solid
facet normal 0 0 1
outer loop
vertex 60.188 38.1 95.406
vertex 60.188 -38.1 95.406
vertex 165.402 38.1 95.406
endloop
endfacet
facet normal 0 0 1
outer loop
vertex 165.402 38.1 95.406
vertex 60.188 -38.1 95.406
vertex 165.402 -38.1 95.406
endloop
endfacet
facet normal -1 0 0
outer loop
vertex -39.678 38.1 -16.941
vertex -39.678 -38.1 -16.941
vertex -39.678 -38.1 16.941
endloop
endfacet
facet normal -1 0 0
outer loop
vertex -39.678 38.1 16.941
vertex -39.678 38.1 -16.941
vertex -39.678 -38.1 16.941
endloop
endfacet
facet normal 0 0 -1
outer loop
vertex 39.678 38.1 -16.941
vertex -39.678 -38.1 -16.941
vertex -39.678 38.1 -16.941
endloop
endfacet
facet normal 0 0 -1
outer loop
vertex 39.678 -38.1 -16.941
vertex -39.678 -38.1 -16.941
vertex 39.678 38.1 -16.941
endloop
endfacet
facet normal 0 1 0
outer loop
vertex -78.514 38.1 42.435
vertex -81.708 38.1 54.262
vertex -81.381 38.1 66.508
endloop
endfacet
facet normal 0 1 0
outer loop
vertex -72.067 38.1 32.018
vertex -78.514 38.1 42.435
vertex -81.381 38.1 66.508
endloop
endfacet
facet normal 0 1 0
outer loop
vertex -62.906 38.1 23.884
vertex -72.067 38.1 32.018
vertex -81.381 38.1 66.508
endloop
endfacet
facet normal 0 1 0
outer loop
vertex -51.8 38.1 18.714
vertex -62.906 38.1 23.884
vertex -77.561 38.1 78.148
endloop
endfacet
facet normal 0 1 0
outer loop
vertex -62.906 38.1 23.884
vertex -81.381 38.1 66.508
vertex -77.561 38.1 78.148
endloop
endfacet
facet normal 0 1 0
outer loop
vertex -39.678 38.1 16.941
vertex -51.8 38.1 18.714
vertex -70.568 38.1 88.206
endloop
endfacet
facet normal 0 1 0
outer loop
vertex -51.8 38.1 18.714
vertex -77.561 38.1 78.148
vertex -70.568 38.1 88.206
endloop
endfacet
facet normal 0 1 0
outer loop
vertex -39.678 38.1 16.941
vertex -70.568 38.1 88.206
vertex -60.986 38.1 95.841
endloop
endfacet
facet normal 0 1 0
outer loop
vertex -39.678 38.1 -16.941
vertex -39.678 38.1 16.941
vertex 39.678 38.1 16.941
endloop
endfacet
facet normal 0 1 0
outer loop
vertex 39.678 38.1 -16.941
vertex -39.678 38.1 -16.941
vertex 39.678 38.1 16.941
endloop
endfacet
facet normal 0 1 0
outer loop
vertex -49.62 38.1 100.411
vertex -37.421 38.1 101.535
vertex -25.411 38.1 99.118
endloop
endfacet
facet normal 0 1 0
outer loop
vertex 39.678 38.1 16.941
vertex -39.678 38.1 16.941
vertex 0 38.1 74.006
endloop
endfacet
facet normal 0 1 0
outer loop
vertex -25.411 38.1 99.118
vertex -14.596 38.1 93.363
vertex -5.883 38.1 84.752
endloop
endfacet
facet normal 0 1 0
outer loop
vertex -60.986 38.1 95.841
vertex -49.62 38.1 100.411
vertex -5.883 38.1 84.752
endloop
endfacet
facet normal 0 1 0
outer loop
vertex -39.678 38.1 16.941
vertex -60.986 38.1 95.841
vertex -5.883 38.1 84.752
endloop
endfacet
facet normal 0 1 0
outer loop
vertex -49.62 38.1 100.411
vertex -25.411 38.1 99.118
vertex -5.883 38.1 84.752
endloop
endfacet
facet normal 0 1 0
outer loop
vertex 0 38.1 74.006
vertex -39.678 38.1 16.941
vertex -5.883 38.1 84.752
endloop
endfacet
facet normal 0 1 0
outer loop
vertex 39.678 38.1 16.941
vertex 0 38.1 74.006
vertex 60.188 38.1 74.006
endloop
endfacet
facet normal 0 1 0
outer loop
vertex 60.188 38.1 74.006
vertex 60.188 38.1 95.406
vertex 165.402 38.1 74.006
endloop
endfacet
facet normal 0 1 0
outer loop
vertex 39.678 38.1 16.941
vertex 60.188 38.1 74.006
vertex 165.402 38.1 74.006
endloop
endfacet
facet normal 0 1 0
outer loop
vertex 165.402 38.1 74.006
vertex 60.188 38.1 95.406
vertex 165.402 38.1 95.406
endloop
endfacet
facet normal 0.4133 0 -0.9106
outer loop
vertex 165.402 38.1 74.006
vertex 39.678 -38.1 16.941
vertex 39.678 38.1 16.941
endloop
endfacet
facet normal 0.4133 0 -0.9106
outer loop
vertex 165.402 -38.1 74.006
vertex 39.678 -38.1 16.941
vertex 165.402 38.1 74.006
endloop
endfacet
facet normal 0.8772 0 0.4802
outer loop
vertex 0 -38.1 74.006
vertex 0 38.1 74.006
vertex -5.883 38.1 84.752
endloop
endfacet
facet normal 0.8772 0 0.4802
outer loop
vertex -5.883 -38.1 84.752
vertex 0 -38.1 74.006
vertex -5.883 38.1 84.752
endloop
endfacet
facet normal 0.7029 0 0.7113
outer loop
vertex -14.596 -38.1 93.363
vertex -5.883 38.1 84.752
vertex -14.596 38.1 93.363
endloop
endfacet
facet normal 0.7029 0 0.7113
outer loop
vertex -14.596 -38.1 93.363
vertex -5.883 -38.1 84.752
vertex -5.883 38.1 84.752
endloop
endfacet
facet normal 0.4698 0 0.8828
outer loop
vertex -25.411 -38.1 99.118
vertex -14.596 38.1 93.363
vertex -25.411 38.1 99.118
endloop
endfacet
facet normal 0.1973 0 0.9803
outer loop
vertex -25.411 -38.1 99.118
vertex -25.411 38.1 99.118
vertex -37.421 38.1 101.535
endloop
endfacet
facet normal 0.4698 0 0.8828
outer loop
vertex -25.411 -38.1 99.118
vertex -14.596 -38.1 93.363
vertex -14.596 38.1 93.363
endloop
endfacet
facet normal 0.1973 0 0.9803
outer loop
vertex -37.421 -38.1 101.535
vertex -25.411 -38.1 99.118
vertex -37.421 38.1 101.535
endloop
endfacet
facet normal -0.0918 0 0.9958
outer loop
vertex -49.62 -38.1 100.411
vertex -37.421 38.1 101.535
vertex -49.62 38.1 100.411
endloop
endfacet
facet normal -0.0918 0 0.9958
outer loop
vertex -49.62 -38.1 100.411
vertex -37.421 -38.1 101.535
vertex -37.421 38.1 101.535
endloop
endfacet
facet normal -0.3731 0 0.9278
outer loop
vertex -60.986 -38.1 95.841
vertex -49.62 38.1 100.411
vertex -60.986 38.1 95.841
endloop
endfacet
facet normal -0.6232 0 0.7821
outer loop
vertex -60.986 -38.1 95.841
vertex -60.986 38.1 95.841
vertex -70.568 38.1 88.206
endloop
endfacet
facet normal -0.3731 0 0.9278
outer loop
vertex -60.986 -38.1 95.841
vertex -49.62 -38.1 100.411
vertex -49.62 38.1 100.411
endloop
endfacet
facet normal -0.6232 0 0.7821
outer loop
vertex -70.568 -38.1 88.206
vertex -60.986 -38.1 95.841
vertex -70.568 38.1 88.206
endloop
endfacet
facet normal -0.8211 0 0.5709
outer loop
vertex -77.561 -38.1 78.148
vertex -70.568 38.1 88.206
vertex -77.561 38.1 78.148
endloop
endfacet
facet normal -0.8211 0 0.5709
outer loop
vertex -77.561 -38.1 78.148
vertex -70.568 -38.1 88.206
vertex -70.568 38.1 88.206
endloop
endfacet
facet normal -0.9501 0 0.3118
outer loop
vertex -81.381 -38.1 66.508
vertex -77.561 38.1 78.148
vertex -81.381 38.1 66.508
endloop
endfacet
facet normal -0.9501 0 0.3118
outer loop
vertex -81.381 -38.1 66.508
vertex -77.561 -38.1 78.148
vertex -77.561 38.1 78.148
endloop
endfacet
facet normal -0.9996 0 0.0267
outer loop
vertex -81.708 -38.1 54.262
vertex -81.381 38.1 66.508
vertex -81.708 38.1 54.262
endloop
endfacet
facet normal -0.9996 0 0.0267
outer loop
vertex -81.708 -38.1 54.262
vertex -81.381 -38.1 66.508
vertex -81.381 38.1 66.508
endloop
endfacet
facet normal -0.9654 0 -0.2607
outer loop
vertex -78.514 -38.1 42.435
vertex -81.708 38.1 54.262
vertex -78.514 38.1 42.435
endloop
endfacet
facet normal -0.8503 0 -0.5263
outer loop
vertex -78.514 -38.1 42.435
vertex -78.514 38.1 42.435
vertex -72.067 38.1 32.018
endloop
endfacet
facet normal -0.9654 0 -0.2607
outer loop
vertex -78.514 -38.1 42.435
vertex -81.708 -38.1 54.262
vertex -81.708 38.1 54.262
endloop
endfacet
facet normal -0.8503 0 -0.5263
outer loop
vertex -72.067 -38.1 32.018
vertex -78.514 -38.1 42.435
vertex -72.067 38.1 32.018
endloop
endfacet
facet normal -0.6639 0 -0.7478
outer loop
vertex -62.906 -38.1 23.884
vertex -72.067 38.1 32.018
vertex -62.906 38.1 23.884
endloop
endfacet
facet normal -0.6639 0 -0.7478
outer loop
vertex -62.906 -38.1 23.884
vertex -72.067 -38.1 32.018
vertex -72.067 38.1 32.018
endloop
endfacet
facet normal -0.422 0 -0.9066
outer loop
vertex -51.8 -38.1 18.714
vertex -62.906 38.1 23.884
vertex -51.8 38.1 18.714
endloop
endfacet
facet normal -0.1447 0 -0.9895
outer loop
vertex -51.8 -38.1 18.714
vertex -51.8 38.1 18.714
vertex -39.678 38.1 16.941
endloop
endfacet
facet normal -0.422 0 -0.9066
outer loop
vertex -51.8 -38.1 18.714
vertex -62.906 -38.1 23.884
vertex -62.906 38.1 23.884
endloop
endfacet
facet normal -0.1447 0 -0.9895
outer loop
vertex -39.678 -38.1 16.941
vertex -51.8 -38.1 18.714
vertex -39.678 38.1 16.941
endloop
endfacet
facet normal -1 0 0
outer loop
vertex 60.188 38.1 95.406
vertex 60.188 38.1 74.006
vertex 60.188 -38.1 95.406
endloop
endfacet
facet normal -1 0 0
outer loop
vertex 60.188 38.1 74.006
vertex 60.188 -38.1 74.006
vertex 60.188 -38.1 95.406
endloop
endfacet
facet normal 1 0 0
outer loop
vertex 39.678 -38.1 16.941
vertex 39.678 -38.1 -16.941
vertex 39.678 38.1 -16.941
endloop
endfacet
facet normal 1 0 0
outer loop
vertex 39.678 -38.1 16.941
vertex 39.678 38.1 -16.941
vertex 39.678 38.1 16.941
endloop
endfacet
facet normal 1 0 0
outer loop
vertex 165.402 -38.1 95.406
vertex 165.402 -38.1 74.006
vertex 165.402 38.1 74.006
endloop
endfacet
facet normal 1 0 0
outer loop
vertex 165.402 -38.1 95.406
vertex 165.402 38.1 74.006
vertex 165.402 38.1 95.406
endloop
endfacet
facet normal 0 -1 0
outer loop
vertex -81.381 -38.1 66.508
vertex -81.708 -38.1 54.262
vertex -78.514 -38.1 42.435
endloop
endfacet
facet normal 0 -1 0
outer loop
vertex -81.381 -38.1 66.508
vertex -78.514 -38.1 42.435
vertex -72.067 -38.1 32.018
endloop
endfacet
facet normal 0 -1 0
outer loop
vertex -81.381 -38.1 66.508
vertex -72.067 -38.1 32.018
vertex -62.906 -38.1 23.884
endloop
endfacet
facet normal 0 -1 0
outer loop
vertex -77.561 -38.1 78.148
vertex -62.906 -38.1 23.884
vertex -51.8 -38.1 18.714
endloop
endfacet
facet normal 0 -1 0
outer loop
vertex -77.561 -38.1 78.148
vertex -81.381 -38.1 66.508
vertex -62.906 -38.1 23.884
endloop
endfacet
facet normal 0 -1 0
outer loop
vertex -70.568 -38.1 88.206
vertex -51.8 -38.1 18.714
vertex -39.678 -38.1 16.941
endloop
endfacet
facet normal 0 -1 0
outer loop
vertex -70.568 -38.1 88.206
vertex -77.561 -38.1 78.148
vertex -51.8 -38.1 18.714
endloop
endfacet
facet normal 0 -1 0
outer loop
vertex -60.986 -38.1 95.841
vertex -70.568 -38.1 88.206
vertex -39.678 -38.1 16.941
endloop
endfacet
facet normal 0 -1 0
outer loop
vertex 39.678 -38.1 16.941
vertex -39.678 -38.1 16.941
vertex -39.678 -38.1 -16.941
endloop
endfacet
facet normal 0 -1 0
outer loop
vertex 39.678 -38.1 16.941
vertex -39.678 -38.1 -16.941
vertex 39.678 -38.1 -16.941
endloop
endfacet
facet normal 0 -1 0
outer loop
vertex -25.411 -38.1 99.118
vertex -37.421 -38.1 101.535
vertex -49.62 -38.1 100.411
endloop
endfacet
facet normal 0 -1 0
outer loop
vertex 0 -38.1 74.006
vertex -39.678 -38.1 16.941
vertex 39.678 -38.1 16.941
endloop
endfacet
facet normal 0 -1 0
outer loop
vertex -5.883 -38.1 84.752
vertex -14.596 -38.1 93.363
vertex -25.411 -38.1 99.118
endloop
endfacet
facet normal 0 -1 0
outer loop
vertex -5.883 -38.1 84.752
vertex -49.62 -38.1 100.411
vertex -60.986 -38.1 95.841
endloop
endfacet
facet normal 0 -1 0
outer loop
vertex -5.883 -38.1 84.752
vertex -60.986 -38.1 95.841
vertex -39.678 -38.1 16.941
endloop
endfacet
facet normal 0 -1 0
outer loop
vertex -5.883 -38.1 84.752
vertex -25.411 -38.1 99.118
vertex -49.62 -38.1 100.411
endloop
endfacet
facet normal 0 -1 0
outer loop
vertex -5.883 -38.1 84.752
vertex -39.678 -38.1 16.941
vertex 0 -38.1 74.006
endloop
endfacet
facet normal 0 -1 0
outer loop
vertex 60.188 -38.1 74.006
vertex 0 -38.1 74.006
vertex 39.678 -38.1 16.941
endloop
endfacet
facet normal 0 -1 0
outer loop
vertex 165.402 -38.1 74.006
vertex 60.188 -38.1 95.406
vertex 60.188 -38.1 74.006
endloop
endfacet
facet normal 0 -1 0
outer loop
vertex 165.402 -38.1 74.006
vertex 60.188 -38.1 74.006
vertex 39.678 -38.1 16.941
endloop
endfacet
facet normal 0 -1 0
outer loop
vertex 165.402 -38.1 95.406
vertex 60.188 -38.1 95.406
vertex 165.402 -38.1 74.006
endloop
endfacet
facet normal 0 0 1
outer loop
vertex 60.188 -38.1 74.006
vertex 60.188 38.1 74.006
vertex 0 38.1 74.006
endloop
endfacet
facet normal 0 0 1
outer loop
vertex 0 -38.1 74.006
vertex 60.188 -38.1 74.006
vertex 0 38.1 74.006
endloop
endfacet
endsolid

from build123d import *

# Parameters (mm, degrees)
F0_W     = 79.356328
F0_H     = 33.882484
F0_W_2   = 105.214015
F0_H_2   = 21.399438
F1_DEPTH = 38.1


with BuildPart() as f1:
    # F0 (on Front) → F1 (new body, symmetric)
    with BuildSketch(Plane.XZ):
        Rectangle(F0_W, F0_H)
        with BuildLine():
            ThreePointArc((0, 74.006468), (-74.43013, 83.431692), (-39.678164, 16.941242))
            Line((-39.678164, 16.941242), (39.678164, 16.941242))
            Line((39.678164, 16.941242), (165.401873, 74.006468))
            Line((165.401873, 74.006468), (60.187858, 74.006468))
            Line((60.187858, 74.006468), (0, 74.006468))
        make_face()
        with Locations((112.794866, 84.706187)):
            Rectangle(F0_W_2, F0_H_2)
    extrude(amount=F1_DEPTH, both=True)


solid = f1.part
